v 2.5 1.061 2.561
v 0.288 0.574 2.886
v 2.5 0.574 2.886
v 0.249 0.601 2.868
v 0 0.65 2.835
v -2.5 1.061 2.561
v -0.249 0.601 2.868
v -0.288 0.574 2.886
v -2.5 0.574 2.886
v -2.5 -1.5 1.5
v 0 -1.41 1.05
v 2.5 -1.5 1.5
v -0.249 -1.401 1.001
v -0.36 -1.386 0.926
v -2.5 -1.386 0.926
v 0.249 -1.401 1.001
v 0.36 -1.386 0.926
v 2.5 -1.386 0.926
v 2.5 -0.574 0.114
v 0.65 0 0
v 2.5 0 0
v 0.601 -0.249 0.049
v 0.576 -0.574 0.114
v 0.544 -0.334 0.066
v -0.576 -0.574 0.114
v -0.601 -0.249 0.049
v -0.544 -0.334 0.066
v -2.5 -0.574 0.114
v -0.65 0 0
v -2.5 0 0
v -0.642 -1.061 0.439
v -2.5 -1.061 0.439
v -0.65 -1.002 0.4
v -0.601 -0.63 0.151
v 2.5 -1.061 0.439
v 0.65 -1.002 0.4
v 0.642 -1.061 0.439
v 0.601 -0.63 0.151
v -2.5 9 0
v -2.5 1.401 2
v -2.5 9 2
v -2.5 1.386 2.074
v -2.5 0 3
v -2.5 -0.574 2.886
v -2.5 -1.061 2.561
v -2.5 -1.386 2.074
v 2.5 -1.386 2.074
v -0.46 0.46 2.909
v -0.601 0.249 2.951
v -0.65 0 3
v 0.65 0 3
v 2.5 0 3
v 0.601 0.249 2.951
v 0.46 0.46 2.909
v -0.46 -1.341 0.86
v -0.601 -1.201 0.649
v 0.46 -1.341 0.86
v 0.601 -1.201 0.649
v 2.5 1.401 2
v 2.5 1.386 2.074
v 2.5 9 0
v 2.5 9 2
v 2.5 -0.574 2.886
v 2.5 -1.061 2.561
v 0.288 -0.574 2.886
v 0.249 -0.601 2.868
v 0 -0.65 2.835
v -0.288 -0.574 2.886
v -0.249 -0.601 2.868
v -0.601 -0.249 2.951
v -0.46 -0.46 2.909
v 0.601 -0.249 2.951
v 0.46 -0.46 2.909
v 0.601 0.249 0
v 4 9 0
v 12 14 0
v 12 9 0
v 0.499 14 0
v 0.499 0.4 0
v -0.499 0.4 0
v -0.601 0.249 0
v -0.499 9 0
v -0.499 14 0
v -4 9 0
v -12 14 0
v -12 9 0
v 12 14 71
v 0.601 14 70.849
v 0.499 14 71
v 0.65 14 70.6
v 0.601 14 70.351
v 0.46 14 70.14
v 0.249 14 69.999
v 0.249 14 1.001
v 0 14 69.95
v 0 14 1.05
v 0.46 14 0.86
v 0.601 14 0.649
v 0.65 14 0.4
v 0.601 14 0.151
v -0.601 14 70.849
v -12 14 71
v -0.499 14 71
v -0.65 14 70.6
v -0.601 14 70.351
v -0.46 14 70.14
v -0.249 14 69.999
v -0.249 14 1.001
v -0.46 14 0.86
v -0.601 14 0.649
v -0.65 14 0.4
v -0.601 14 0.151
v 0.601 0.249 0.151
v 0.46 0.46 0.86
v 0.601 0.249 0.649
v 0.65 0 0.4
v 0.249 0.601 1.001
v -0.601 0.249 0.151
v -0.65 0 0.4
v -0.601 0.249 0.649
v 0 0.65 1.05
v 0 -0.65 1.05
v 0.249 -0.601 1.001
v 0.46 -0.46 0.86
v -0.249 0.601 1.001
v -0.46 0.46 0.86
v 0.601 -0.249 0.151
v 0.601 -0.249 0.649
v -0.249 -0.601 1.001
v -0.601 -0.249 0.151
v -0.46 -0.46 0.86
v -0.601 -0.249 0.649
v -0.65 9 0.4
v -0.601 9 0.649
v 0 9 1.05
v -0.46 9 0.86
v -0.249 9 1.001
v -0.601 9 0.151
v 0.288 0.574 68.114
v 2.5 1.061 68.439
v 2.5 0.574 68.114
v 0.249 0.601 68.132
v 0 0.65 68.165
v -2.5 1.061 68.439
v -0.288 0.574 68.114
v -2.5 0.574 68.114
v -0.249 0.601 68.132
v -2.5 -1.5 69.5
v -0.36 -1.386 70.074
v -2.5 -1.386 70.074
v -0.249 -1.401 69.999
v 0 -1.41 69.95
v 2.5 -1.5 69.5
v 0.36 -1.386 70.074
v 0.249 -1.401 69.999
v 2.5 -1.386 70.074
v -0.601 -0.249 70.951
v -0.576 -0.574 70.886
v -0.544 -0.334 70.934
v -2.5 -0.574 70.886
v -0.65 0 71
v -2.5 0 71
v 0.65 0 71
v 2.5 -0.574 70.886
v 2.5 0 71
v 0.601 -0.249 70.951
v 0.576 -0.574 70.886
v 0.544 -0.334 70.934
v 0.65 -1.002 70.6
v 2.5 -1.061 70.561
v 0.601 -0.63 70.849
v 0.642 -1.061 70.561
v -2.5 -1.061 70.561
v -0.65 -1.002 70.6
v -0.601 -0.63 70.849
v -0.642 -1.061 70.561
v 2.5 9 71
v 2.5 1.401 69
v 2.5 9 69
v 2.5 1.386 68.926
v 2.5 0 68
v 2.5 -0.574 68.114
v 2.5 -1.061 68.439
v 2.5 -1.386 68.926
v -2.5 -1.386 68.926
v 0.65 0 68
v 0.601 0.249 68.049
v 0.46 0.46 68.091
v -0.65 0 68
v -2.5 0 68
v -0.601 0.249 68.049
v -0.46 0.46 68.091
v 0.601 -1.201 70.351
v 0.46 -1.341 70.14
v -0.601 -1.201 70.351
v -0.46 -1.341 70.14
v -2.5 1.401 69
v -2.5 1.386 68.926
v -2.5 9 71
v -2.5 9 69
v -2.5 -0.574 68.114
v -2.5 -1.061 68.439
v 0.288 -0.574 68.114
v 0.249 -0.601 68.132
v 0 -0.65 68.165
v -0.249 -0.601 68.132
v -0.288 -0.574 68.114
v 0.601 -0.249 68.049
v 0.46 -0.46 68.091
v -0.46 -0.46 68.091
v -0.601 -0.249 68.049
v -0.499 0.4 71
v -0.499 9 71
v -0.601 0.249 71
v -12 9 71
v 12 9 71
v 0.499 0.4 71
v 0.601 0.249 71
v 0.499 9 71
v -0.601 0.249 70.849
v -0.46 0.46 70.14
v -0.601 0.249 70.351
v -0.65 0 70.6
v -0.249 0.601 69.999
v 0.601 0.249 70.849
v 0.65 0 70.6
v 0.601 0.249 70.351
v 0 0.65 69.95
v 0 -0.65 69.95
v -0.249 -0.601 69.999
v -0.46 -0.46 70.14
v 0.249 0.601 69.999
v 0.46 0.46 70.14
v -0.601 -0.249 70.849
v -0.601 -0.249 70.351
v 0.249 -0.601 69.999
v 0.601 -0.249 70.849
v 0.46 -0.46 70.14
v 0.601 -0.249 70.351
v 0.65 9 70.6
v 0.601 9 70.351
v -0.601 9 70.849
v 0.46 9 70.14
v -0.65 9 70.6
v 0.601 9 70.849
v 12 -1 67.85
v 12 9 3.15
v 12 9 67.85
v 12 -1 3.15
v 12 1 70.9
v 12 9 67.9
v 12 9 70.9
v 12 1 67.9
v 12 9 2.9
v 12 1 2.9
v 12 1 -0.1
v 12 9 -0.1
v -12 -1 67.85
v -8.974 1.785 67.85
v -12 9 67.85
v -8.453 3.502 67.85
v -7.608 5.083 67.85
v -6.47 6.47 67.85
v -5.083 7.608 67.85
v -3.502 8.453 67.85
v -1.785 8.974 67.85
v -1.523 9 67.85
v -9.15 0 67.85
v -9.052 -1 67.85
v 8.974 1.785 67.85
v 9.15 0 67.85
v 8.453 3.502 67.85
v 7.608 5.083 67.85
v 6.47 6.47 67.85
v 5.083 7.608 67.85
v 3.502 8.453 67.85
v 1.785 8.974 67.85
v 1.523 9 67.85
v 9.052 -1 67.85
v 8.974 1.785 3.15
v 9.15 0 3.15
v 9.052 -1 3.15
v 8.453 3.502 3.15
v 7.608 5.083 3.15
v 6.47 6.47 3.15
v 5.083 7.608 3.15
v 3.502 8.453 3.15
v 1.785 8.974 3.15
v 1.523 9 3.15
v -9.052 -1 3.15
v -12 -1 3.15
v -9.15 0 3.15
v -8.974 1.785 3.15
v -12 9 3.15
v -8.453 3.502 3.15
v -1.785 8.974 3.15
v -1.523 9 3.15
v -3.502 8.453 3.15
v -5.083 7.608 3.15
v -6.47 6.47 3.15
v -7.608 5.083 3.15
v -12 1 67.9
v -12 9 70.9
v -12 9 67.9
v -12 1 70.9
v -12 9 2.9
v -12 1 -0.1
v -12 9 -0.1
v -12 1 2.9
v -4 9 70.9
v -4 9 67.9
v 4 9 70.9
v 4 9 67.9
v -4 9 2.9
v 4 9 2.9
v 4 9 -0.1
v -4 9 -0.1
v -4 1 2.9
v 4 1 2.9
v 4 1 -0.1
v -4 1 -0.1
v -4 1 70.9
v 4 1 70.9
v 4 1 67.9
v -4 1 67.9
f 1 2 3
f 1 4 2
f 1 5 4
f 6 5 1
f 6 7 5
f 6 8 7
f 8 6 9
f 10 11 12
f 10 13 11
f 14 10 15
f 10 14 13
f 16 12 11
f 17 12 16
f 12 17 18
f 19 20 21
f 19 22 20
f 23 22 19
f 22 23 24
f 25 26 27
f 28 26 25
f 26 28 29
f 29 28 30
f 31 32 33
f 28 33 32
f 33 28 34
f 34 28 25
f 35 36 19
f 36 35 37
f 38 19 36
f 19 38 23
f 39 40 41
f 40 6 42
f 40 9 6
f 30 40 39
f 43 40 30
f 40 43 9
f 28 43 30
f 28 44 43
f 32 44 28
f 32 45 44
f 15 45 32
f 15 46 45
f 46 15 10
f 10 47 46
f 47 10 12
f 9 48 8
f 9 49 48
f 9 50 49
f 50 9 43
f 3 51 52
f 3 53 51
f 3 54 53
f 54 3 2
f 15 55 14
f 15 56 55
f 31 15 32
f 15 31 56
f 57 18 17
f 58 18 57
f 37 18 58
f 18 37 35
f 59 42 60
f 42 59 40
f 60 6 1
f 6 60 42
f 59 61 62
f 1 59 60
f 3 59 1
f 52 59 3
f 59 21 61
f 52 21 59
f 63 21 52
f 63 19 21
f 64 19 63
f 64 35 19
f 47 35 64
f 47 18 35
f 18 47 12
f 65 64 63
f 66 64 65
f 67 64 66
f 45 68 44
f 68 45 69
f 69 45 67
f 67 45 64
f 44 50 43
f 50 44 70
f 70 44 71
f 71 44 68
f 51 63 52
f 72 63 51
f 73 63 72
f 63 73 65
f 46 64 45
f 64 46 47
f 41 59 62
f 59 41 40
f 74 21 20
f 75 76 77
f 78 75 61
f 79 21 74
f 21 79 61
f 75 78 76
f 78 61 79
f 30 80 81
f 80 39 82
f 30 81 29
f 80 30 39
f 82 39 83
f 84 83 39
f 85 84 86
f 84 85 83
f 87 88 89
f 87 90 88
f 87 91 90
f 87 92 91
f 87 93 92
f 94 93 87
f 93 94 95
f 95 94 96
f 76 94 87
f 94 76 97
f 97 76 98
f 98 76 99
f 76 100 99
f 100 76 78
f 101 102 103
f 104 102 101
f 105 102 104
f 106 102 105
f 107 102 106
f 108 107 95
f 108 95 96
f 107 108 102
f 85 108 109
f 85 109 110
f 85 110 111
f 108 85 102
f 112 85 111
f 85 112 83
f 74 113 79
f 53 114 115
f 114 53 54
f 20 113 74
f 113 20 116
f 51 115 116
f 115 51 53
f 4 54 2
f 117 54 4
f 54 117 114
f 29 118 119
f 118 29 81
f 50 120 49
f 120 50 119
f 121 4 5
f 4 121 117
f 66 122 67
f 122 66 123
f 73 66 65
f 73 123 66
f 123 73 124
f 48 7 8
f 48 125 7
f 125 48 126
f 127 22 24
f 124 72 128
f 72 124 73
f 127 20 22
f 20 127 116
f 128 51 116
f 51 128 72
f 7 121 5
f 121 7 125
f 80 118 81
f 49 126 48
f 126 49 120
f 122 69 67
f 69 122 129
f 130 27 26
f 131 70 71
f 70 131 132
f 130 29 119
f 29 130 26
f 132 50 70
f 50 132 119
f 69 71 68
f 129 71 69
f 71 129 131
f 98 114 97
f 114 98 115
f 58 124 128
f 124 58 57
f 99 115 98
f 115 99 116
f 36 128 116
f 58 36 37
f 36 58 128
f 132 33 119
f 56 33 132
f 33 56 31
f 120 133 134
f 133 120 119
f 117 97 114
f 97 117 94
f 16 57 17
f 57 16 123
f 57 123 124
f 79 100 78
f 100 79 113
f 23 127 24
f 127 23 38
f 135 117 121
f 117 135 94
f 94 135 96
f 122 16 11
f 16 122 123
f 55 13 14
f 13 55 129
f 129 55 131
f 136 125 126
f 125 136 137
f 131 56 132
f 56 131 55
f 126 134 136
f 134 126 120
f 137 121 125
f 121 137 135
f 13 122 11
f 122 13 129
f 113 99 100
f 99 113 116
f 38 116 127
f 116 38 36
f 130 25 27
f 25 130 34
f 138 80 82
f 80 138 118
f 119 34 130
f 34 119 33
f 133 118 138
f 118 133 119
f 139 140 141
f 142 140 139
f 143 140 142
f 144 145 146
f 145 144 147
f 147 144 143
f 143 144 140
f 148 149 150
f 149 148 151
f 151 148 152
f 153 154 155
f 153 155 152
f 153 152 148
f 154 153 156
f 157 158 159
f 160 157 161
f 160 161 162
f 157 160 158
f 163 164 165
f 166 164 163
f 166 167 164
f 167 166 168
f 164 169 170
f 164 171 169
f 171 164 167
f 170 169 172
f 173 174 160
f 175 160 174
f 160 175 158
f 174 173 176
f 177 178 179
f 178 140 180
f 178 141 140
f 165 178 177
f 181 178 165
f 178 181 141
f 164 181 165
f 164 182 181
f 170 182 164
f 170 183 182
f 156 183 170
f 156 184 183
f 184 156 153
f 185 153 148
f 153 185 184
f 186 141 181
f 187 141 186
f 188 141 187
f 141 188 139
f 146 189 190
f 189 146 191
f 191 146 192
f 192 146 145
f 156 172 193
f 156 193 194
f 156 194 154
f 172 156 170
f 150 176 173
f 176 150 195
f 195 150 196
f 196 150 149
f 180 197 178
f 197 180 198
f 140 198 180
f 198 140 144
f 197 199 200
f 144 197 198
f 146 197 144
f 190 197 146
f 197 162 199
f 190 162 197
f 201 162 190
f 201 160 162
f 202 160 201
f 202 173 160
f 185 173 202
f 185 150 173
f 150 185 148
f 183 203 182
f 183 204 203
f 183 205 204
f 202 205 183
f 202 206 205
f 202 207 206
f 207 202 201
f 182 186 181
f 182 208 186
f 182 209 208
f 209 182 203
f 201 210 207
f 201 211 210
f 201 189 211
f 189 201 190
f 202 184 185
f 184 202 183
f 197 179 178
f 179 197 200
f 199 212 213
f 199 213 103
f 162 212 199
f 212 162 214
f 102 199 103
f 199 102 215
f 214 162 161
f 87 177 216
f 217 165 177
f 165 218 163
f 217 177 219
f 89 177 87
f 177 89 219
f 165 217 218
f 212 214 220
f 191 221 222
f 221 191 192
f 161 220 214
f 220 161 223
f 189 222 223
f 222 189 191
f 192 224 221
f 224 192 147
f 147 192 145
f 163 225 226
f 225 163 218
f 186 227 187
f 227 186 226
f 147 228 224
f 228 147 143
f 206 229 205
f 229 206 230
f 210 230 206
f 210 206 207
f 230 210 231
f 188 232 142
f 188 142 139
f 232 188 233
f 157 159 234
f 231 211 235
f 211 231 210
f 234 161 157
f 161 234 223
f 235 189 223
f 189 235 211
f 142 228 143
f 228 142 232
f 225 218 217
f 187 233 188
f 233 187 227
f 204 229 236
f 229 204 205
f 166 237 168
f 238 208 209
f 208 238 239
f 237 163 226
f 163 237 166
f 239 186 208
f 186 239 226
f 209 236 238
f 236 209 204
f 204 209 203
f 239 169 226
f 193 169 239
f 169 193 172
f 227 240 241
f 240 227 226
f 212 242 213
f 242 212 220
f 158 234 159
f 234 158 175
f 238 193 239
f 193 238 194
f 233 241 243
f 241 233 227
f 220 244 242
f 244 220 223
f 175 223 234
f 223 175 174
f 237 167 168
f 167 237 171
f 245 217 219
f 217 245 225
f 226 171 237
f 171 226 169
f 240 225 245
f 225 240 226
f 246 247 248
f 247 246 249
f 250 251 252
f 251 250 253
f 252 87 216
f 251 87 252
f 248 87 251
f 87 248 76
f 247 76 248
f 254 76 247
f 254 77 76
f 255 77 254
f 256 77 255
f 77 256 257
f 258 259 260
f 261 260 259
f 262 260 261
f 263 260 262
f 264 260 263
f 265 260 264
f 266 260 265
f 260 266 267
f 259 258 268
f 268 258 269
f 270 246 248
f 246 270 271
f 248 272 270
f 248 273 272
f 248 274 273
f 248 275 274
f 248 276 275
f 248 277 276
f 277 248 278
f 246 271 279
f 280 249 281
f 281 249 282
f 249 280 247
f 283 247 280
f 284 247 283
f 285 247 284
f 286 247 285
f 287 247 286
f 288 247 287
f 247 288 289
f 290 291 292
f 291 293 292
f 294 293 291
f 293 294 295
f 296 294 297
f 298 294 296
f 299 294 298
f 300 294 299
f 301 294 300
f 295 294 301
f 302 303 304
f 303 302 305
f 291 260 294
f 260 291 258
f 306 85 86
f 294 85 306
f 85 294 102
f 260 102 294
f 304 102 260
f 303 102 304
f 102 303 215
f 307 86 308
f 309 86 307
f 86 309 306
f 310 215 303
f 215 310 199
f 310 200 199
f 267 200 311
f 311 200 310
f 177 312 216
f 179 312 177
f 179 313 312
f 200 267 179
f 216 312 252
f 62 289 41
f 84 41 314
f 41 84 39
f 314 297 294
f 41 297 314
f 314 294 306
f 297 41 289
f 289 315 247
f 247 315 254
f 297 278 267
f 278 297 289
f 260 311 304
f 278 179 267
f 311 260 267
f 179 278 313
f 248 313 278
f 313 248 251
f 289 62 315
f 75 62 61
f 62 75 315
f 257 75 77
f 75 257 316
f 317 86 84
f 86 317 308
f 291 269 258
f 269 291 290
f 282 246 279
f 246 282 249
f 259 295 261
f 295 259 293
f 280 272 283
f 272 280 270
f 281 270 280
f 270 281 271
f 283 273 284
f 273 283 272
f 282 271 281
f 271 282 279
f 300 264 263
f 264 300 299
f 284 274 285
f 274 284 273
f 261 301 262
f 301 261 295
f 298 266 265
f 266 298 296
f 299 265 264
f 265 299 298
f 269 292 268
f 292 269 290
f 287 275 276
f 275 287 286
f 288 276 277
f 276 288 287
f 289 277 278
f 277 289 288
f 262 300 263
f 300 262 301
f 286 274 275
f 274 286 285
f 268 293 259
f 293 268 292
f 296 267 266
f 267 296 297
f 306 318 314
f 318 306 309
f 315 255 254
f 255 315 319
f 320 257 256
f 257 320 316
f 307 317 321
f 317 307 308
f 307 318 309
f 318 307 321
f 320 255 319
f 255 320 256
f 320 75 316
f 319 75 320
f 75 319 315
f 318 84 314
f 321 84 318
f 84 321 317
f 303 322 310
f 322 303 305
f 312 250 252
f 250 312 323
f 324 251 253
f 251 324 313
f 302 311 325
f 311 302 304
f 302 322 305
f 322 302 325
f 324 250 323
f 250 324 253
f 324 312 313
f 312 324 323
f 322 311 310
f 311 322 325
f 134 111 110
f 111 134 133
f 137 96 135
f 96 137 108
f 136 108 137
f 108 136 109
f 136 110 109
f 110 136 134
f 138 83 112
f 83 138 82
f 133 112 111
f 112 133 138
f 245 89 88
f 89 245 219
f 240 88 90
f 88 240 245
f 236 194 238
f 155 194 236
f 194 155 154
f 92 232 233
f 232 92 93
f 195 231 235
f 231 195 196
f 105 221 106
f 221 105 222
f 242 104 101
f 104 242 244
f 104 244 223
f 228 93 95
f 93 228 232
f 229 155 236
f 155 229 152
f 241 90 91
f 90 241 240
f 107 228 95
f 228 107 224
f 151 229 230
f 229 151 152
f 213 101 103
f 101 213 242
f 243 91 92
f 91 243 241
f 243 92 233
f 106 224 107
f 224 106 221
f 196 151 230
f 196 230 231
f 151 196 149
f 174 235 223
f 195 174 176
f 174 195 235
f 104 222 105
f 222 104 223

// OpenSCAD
module terminal(tolerance=0.3) {
  connectorSize = [5,14,2];

  translate([-.5*connectorSize[0],0,0])
  difference(){
    union(){
      translate([0,0,1.5])
      rotate([0,90,0])
      cylinder(r=1.5,h=connectorSize[0], $fn=16);
      
      cube(connectorSize);
    }
    
    translate([connectorSize[0]/2,0,-.5])
    rotate([0,0,0])
    cylinder(r=(1+tolerance)/2, h=5, $fn=16);
    
    translate([connectorSize[0]/2,16,0.4])
    rotate([90,0,0])
    cylinder(r=(1+tolerance)/2, h=20, $fn=16);

  }
}

module cell18650(tolerance=0.3) {
  cylinder(r=(18+tolerance)/2, h=65,$fn=32);
}

module holder(tolerance=0.3, showCell=true){
  plateSize = [24,5,65+6];
  stabilizerSize = [24,10,65-tolerance];
  verticalStabSize = [24,8,3];
  
  difference(){
      
    union(){
      terminal();

      translate([0,0,65+6])
      rotate([0,180,0])
      terminal();
      
      translate([.5,.5,0]*-plateSize[0] + [0,14+plateSize[1]+2,0])
      cube(plateSize);
      
      if(showCell) {
        #
        translate([0,0,3])
          cell18650();
      }
      
      // Stabilizer fins to stop cell from moving horizontally
      difference() {      
        translate([0,4,plateSize[2]*0.5])
        translate(-.5*stabilizerSize)
          cube(stabilizerSize);
        
        translate([0,0,3])
          cell18650();
      }
      
      // Vert stab to stop cell from moving vertically
      translate(verticalStabSize*-.5+[0,5,2-tolerance*2])
      difference(){
        cube(verticalStabSize);        
        translate([verticalStabSize[0]-8,-1,-1]*.5)
        cube(verticalStabSize-[16,-1,-2]);
      }
      
      translate(verticalStabSize*-.5+[0,5,2-tolerance*2 + 65+6 - 3])
      difference(){
        cube(verticalStabSize);        
        translate([verticalStabSize[0]-8,-1,-1]*.5)
        cube(verticalStabSize-[16,-1,-2]);
      }

    }
    
    translate([0,16,0.4])
    rotate([90,0,0])
      cylinder(r=(1+tolerance)/2, h=20, $fn=16);
    
    translate([0,16,65+6-0.4])
    rotate([90,0,0])
      cylinder(r=(1+tolerance)/2, h=20, $fn=16);

  }
}

holder(showCell=false);
